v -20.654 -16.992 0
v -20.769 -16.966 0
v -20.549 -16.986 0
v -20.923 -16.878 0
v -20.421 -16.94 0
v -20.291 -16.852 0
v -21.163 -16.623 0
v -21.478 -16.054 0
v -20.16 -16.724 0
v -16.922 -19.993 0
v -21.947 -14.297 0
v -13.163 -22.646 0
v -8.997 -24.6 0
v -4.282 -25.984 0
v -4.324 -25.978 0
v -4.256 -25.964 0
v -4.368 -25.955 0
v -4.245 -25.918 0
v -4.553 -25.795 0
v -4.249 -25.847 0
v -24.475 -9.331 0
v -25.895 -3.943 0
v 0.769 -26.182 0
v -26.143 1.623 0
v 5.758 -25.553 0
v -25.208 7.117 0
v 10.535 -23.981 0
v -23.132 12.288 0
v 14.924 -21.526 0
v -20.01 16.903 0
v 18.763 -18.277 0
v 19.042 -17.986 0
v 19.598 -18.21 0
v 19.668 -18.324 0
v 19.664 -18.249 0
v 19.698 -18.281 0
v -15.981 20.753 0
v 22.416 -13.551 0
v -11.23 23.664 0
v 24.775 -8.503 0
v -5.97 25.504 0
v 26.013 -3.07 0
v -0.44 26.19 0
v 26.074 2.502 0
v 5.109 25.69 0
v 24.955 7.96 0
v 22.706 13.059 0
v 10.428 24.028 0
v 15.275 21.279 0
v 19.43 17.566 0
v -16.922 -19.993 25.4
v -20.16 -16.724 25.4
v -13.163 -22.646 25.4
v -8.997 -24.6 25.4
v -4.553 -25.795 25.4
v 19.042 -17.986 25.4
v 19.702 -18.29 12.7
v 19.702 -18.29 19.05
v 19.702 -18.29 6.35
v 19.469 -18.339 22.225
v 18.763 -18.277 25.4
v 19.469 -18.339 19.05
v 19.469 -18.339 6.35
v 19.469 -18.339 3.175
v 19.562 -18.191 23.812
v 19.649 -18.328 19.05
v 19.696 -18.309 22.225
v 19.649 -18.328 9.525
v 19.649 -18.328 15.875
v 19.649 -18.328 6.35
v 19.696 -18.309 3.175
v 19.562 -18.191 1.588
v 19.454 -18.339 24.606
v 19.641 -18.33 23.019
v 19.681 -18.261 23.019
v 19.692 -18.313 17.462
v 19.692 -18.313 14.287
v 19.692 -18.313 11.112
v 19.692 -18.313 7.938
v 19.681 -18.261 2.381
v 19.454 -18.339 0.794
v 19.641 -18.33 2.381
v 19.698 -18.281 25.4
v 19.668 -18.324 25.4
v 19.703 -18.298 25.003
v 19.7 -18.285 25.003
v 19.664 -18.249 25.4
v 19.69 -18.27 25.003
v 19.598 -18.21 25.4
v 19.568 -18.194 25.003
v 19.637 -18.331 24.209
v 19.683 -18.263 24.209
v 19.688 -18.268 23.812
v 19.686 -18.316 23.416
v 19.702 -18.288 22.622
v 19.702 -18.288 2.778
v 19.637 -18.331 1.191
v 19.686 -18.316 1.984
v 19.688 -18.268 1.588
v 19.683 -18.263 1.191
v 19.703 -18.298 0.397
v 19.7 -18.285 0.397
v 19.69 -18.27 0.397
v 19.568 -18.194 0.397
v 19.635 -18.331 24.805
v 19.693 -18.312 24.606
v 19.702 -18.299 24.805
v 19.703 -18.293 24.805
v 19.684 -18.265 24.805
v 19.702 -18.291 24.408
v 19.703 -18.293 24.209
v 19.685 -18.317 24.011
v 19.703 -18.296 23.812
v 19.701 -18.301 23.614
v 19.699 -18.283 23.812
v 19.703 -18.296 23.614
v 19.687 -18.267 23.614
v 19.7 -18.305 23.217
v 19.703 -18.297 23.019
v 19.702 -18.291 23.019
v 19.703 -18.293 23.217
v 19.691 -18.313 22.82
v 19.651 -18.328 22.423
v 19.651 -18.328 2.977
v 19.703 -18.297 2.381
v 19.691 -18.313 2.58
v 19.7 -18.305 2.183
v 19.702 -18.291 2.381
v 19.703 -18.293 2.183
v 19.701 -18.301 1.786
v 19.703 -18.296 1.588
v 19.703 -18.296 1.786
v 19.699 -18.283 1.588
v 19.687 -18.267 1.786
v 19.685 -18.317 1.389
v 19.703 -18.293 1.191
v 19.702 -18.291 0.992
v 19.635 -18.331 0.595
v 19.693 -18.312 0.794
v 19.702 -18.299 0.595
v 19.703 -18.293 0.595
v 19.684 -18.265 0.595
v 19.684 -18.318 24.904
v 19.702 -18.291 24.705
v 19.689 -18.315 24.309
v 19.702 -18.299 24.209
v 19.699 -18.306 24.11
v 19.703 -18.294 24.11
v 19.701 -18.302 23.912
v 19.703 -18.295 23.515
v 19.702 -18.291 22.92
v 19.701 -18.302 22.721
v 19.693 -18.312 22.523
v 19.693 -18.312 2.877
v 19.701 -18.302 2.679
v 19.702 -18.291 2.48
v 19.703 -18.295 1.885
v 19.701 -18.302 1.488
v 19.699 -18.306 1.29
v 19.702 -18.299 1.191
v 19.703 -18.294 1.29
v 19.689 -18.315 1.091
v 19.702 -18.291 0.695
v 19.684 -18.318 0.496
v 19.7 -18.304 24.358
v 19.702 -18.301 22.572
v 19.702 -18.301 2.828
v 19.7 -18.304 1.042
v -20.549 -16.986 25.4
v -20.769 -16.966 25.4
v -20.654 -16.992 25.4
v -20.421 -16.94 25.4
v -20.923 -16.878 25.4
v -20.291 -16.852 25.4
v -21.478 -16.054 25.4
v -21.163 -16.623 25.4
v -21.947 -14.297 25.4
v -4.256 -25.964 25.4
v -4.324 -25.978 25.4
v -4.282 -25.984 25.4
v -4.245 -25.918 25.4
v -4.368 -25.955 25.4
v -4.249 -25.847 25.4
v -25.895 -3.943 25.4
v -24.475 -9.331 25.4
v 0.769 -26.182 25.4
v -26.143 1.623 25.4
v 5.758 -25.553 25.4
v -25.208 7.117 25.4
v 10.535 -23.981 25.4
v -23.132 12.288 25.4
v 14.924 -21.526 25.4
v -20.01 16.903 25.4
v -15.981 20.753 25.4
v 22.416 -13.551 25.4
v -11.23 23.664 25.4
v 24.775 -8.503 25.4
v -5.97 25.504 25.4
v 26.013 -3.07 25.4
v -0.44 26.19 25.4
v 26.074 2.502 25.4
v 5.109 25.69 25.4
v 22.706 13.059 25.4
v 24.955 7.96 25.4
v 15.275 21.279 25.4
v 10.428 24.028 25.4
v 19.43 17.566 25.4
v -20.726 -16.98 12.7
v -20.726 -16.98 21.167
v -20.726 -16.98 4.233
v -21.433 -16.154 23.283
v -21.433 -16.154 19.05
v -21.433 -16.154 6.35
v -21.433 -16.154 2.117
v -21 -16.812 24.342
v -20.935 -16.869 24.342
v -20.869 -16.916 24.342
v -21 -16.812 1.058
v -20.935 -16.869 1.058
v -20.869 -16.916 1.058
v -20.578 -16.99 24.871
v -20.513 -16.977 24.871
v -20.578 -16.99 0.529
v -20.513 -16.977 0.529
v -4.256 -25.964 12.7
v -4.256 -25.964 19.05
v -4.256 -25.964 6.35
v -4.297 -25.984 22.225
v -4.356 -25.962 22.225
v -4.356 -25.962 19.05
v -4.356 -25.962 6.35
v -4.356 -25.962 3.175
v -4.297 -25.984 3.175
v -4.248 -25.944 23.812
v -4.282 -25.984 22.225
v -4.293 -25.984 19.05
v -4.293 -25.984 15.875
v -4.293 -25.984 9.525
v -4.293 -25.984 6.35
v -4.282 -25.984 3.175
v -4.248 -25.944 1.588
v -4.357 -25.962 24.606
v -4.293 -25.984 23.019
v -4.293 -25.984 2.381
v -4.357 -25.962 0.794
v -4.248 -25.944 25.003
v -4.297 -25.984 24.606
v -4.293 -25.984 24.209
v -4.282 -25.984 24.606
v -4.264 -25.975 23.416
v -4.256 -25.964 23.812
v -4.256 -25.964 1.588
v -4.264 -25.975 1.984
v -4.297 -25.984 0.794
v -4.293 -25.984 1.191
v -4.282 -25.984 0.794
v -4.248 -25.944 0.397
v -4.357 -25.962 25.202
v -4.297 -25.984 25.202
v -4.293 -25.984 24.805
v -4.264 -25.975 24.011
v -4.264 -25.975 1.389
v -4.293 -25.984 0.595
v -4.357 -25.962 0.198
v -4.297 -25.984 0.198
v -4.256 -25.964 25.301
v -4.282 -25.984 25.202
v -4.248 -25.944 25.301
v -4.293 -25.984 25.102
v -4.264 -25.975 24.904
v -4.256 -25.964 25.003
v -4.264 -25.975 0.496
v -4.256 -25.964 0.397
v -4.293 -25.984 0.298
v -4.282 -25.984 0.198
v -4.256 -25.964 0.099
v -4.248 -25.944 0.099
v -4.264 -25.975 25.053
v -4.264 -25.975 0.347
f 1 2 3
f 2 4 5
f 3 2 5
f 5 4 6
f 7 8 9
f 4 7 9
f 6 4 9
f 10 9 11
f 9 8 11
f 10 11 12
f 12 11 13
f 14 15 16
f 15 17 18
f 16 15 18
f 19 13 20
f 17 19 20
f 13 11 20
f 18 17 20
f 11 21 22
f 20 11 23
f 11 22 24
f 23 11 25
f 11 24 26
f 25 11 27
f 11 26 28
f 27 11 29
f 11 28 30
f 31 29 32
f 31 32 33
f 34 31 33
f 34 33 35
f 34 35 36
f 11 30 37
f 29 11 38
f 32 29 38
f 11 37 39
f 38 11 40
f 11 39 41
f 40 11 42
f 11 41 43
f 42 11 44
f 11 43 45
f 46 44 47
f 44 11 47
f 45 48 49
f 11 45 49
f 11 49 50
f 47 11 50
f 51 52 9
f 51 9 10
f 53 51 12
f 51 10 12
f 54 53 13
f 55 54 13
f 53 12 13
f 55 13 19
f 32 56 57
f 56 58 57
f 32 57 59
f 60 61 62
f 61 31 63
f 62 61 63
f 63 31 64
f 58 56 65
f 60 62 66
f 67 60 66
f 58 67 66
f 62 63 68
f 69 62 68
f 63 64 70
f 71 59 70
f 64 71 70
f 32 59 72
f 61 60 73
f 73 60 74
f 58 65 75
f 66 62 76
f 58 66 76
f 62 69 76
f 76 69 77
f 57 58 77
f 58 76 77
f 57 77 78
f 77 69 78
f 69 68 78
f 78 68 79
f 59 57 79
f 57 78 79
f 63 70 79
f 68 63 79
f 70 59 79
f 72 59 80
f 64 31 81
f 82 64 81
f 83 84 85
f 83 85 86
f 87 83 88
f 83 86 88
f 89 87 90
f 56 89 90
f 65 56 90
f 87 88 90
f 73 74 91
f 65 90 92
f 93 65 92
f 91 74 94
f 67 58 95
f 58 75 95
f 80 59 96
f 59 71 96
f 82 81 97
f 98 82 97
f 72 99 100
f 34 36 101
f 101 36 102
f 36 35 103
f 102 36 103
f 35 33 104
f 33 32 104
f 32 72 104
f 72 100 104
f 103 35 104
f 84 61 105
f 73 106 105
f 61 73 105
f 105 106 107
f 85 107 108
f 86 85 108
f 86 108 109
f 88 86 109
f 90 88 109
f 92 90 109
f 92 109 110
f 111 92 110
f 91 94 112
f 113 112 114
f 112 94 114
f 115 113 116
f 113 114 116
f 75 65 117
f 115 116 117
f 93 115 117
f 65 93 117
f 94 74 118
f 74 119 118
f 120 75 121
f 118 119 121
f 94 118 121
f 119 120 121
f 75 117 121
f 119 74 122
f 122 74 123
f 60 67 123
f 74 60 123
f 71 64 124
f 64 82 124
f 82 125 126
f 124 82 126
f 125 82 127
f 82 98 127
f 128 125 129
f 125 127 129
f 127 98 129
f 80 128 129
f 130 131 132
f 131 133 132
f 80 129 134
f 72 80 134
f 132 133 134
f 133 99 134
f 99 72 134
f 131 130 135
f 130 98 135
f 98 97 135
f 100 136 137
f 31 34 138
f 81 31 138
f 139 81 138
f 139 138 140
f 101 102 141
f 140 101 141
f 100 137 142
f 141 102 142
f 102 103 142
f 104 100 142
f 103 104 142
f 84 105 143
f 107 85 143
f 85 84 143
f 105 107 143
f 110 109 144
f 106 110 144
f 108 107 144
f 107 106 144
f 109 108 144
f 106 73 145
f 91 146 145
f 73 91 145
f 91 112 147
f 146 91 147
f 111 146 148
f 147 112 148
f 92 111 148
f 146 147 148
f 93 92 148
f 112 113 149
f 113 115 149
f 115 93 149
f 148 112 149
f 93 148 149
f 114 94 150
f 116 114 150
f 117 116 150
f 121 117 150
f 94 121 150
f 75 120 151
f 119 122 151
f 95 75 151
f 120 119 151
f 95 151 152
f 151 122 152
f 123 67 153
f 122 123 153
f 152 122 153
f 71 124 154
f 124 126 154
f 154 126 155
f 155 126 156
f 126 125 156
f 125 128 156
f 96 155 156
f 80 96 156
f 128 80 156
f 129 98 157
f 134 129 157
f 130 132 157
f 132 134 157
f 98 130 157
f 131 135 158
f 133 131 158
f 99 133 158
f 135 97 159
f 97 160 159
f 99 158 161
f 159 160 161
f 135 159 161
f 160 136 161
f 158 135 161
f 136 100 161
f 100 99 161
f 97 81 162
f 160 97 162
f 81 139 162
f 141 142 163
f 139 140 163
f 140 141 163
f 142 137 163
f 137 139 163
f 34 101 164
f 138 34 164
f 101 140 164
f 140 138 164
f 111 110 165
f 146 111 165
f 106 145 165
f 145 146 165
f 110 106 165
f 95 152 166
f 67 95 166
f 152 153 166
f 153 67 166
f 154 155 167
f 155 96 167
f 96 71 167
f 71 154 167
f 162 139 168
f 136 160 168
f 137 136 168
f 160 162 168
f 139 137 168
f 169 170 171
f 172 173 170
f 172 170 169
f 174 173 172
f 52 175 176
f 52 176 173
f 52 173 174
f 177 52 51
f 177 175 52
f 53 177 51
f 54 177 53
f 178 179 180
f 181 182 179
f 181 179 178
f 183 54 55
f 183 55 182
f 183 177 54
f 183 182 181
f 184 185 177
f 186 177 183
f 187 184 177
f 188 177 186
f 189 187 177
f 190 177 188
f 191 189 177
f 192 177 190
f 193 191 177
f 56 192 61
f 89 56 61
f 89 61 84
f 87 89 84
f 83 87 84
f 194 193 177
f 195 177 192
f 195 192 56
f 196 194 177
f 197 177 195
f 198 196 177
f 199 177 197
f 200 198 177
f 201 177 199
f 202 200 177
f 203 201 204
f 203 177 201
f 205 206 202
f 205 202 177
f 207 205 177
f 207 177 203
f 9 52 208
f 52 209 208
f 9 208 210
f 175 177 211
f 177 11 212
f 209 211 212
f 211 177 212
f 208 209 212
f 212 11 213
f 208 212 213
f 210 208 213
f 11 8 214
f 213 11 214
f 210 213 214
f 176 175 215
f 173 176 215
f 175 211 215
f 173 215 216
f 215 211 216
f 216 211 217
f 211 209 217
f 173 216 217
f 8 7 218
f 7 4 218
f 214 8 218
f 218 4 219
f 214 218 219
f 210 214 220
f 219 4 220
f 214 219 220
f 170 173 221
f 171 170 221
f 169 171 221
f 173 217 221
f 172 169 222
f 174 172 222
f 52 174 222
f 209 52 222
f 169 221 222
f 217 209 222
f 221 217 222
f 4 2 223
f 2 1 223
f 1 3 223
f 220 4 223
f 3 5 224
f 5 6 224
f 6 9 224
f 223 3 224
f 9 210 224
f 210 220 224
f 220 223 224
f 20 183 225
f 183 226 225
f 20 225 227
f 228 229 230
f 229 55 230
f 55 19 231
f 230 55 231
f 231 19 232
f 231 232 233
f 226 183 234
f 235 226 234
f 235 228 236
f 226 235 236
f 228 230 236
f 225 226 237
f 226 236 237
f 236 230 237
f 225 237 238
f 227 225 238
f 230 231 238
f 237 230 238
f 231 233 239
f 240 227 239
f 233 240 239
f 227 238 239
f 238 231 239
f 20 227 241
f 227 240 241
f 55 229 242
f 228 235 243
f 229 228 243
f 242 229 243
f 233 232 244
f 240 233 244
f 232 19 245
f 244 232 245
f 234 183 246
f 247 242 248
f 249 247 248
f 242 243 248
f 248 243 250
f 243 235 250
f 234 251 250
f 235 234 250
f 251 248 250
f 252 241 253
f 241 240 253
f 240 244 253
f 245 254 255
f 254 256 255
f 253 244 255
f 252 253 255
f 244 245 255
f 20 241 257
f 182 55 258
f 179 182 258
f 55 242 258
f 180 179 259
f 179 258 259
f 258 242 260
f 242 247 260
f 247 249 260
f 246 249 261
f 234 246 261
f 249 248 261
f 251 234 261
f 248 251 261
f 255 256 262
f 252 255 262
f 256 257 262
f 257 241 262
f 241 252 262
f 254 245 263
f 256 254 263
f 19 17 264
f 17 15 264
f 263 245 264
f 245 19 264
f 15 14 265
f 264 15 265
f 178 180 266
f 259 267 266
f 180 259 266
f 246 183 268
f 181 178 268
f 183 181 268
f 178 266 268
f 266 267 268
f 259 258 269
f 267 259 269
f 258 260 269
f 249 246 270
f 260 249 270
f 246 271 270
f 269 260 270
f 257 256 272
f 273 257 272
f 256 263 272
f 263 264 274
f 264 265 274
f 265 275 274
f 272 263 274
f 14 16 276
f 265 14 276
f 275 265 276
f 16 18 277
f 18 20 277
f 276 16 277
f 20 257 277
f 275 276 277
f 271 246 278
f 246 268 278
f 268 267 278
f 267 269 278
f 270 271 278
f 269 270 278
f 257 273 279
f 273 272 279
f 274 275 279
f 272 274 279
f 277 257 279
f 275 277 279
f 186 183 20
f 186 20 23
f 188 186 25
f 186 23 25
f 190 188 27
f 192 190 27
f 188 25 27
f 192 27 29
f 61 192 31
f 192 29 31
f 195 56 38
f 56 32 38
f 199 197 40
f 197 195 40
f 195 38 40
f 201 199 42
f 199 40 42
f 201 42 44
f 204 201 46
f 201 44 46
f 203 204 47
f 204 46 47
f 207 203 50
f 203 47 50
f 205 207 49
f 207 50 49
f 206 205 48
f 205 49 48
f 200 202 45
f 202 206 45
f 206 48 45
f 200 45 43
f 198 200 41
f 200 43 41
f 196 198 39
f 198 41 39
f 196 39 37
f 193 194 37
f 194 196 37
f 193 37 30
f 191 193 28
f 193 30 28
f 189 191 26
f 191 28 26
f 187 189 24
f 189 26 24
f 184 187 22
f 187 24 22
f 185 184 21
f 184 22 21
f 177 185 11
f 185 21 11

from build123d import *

# Parameters (mm, degrees)
F0_R     = 26.1934474338
F1_DEPTH = 25.4
F3_DEPTH = 25.4


with BuildPart() as f1:
    # F0 (on Top) → F1 (new body)
    with BuildSketch(Plane.XY):
        Circle(F0_R)
    extrude(amount=F1_DEPTH)

    # F2 (on Top) → F3 (join)
    with BuildSketch(Plane.XY):
        with BuildLine():
            add(Edge.make_bspline(
                [(0, 5.7371510193), (1.6267507168, 6.5317427394), (1.5843386729, 11.0500053178), (-18.7787446742, 30.5963069359), (1.0221837778, 10.0953171298), (-6.0703650923, 6.4711935479), (-5.7371528819, 5.7371510193)],
                knots=[0, 0, 0, 0, 0.1511009621, 0.424902673, 0.683029848, 0.8377276017, 0.8377276017, 0.8377276017, 0.8377276017], degree=3))
            Line((-5.7371528819, 5.7371510193), (0, 5.7371510193))
        make_face()
        with BuildLine():
            add(Edge.make_bspline(
                [(-5.7371528819, 5.7371510193), (-5.3876252175, 4.9671667193), (-1.7470222336, 4.8838122825), (0, 5.7371510193)],
                knots=[0.8377276017, 0.8377276017, 0.8377276017, 0.8377276017, 1, 1, 1, 1], degree=3))
            Line((-5.7371528819, 5.7371510193), (-5.7371528819, 4.7594812791))
            add(Edge.make_bspline(
                [(-4.2555169202, 3.7961523049), (-4.6271368693, 4.2676092134), (-5.1324220693, 4.5873594513), (-5.7371528819, 4.7594812791)],
                knots=[0, 0, 0, 0, 0.0403249023, 0.0403249023, 0.0403249023, 0.0403249023], degree=3))
            add(Edge.make_bspline(
                [(-5.7371528819, -0.1313178609), (-5.0377167443, -0.2417768077), (-3.1863723457, -0.3506748101), (-3.3498793663, 2.6472121512), (-4.2555169202, 3.7961523049)],
                knots=[0.8562834152, 0.8562834152, 0.8562834152, 0.8562834152, 0.9017282416, 1, 1, 1, 1], degree=3))
            Line((-5.7371528819, -0.1313178609), (-5.7371528819, -2.1932371892))
            add(Edge.make_bspline(
                [(-3.1325055752, -4.8068023752), (-2.8964414897, -3.6216016793), (-4.2171599325, -2.2319944033), (-5.7371528819, -2.1932371892)],
                knots=[0.8793176122, 0.8793176122, 0.8793176122, 0.8793176122, 1, 1, 1, 1], degree=3))
            Line((-3.1325055752, -4.8068023752), (-0.1550579909, -4.8068023752))
            add(Edge.make_bspline(
                [(2.8568834532, -4.8068023752), (2.4981673069, -4.0406447813), (0.9717753652, -4.0108397725), (-0.1550579909, -4.8068023752)],
                knots=[0.8885466284, 0.8885466284, 0.8885466284, 0.8885466284, 1, 1, 1, 1], degree=3))
            Line((2.8568834532, -4.8068023752), (5.4270369001, -4.8068023752))
            add(Edge.make_bspline(
                [(5.1070004252, 0.7479401206), (3.8398501756, 0.9918001557), (1.7682794649, 1.160584436), (4.1739226049, -3.5994525554), (5.4270369001, -4.8068023752)],
                knots=[0.7487514035, 0.7487514035, 0.7487514035, 0.7487514035, 0.8399311786, 1, 1, 1, 1], degree=3))
            add(Edge.make_bspline(
                [(4.889054848, 5.7371510193), (4.5975376375, 3.263116652), (4.6347225971, 1.4558693669), (5.1070004252, 0.7479401206)],
                knots=[0.8394506838, 0.8394506838, 0.8394506838, 0.8394506838, 0.9741904697, 0.9741904697, 0.9741904697, 0.9741904697], degree=3))
            Line((4.889054848, 5.7371510193), (0, 5.7371510193))
        make_face()
        with BuildLine():
            Line((0, 5.7371510193), (-5.7371528819, 5.7371510193))
            add(Edge.make_bspline(
                [(-5.7371528819, 5.7371510193), (-5.3876252175, 4.9671667193), (-1.7470222336, 4.8838122825), (0, 5.7371510193)],
                knots=[0.8377276017, 0.8377276017, 0.8377276017, 0.8377276017, 1, 1, 1, 1], degree=3))
        make_face()
        with BuildLine():
            add(Edge.make_bspline(
                [(-4.2555169202, 3.7961523049), (-4.6271368693, 4.2676092134), (-5.1324220693, 4.5873594513), (-5.7371528819, 4.7594812791)],
                knots=[0, 0, 0, 0, 0.0403249023, 0.0403249023, 0.0403249023, 0.0403249023], degree=3))
            Line((-5.7371528819, 4.7594812791), (-5.7371528819, -0.1313178609))
            add(Edge.make_bspline(
                [(-5.7371528819, -0.1313178609), (-5.0377167443, -0.2417768077), (-3.1863723457, -0.3506748101), (-3.3498793663, 2.6472121512), (-4.2555169202, 3.7961523049)],
                knots=[0.8562834152, 0.8562834152, 0.8562834152, 0.8562834152, 0.9017282416, 1, 1, 1, 1], degree=3))
        make_face()
        with BuildLine():
            Line((-5.7371528819, -0.1313178609), (-5.7371528819, 4.7594812791))
            add(Edge.make_bspline(
                [(-5.7371528819, 4.7594812791), (-7.0672055678, 5.1380482291), (-13.2464175654, 3.9931288798), (-24.0258726863, -8.8045876378), (-20.7617534642, -19.3483537757), (-18.1986372399, -11.9907759807), (-12.1603143643, 1.4470897092), (-6.8760904444, 0.0485496593), (-5.7371528819, -0.1313178609)],
                knots=[0.0403249023, 0.0403249023, 0.0403249023, 0.0403249023, 0.1290160082, 0.3429240679, 0.4728776808, 0.5849693808, 0.7822826352, 0.8562834152, 0.8562834152, 0.8562834152, 0.8562834152], degree=3))
        make_face()
        with BuildLine():
            add(Edge.make_bspline(
                [(6.1286271555, 0.5429710291), (7.0762360434, 1.0167670646), (11.0781985914, 6.645529309), (11.6659229825, 33.035172441), (6.1044874657, 13.7751740637), (5.0123059155, 6.7831523041), (4.889054848, 5.7371510193)],
                knots=[0.0411972981, 0.0411972981, 0.0411972981, 0.0411972981, 0.1880200779, 0.4976067702, 0.7824838158, 0.8394506838, 0.8394506838, 0.8394506838, 0.8394506838], degree=3))
            Line((4.889054848, 5.7371510193), (5.4270369001, 5.7371510193))
            Line((5.4270369001, 5.7371510193), (5.4270369001, 0.6849323422))
            add(Edge.make_bspline(
                [(6.1286271555, 0.5429710291), (5.8814162536, 0.5927902082), (5.6474452229, 0.6407864188), (5.4270369001, 0.6849323422)],
                knots=[0.7264412514, 0.7264412514, 0.7264412514, 0.7264412514, 0.7413205009, 0.7413205009, 0.7413205009, 0.7413205009], degree=3))
        make_face()
        with BuildLine():
            Line((5.4270369001, 5.7371510193), (4.889054848, 5.7371510193))
            add(Edge.make_bspline(
                [(4.889054848, 5.7371510193), (4.5975376375, 3.263116652), (4.6347225971, 1.4558693669), (5.1070004252, 0.7479401206)],
                knots=[0.8394506838, 0.8394506838, 0.8394506838, 0.8394506838, 0.9741904697, 0.9741904697, 0.9741904697, 0.9741904697], degree=3))
            add(Edge.make_bspline(
                [(5.4270369001, 0.6849323422), (5.3169619395, 0.706979426), (5.2102697103, 0.7280661937), (5.1070004252, 0.7479401206)],
                knots=[0.7413205009, 0.7413205009, 0.7413205009, 0.7413205009, 0.7487514035, 0.7487514035, 0.7487514035, 0.7487514035], degree=3))
            Line((5.4270369001, 0.6849323422), (5.4270369001, 5.7371510193))
        make_face()
        with BuildLine():
            add(Edge.make_bspline(
                [(5.4270369001, -4.8068023752), (6.5215892647, -5.86138104), (9.0814416321, -4.8797008059), (35.4559927911, 1.9981107546), (13.511505867, -0.8744141955), (7.0857452583, 0.3500877954), (6.1286271555, 0.5429710291)],
                knots=[0, 0, 0, 0, 0.1398146264, 0.4061072479, 0.6688337637, 0.7264412514, 0.7264412514, 0.7264412514, 0.7264412514], degree=3))
            add(Edge.make_bspline(
                [(5.4270369001, 0.465174322), (5.6235961964, 0.3823429293), (5.862735678, 0.4100276497), (6.1286271555, 0.5429710291)],
                knots=[0, 0, 0, 0, 0.0411972981, 0.0411972981, 0.0411972981, 0.0411972981], degree=3))
            Line((5.4270369001, 0.465174322), (5.4270369001, -4.8068023752))
        make_face()
        with BuildLine():
            add(Edge.make_bspline(
                [(5.4270369001, 0.465174322), (5.6235961964, 0.3823429293), (5.862735678, 0.4100276497), (6.1286271555, 0.5429710291)],
                knots=[0, 0, 0, 0, 0.0411972981, 0.0411972981, 0.0411972981, 0.0411972981], degree=3))
            add(Edge.make_bspline(
                [(6.1286271555, 0.5429710291), (5.8814162536, 0.5927902082), (5.6474452229, 0.6407864188), (5.4270369001, 0.6849323422)],
                knots=[0.7264412514, 0.7264412514, 0.7264412514, 0.7264412514, 0.7413205009, 0.7413205009, 0.7413205009, 0.7413205009], degree=3))
            Line((5.4270369001, 0.6849323422), (5.4270369001, 0.465174322))
        make_face()
        with BuildLine():
            add(Edge.make_bspline(
                [(5.1070004252, 0.7479401206), (5.1974656789, 0.6123356205), (5.3038952538, 0.5170670294), (5.4270369001, 0.465174322)],
                knots=[0.9741904697, 0.9741904697, 0.9741904697, 0.9741904697, 1, 1, 1, 1], degree=3))
            add(Edge.make_bspline(
                [(5.1070004252, 0.7479401206), (3.8398501756, 0.9918001557), (1.7682794649, 1.160584436), (4.1739226049, -3.5994525554), (5.4270369001, -4.8068023752)],
                knots=[0.7487514035, 0.7487514035, 0.7487514035, 0.7487514035, 0.8399311786, 1, 1, 1, 1], degree=3))
            Line((5.4270369001, -4.8068023752), (5.4270369001, 0.465174322))
        make_face()
        with BuildLine():
            add(Edge.make_bspline(
                [(-3.1325055752, -4.8068023752), (-2.8964414897, -3.6216016793), (-4.2171599325, -2.2319944033), (-5.7371528819, -2.1932371892)],
                knots=[0.8793176122, 0.8793176122, 0.8793176122, 0.8793176122, 1, 1, 1, 1], degree=3))
            Line((-5.7371528819, -2.1932371892), (-5.7371528819, -4.8068023752))
            Line((-5.7371528819, -4.8068023752), (-3.1325055752, -4.8068023752))
        make_face()
        with BuildLine():
            Line((-5.7371528819, -4.8068023752), (-5.7371528819, -2.1932371892))
            add(Edge.make_bspline(
                [(-5.7371528819, -2.1932371892), (-8.2702480143, -2.1286476065), (-15.2637567392, -10.4829218888), (1.1548852436, -34.9795429341), (-12.5198781123, -9.6692653362), (-3.4869213883, -6.5862084526), (-3.1325055752, -4.8068023752)],
                knots=[0, 0, 0, 0, 0.2011193337, 0.4556984268, 0.6981305988, 0.8793176122, 0.8793176122, 0.8793176122, 0.8793176122], degree=3))
            Line((-3.1325055752, -4.8068023752), (-5.7371528819, -4.8068023752))
        make_face()
        with BuildLine():
            add(Edge.make_bspline(
                [(-0.1550579909, -4.8068023752), (-1.8415339198, -5.9980803603), (-4.0234818259, -14.3814094127), (34.0148534446, -21.3494707734), (-1.5085435319, -12.7563424956), (3.3555713209, -5.8719161169), (2.8568834532, -4.8068023752)],
                knots=[0, 0, 0, 0, 0.1668067664, 0.4598523912, 0.7336039397, 0.8885466284, 0.8885466284, 0.8885466284, 0.8885466284], degree=3))
            Line((2.8568834532, -4.8068023752), (-0.1550579909, -4.8068023752))
        make_face()
        with BuildLine():
            Line((-0.1550579909, -4.8068023752), (2.8568834532, -4.8068023752))
            add(Edge.make_bspline(
                [(2.8568834532, -4.8068023752), (2.4981673069, -4.0406447813), (0.9717753652, -4.0108397725), (-0.1550579909, -4.8068023752)],
                knots=[0.8885466284, 0.8885466284, 0.8885466284, 0.8885466284, 1, 1, 1, 1], degree=3))
        make_face()
    extrude(amount=F3_DEPTH)


solid = f1.part
